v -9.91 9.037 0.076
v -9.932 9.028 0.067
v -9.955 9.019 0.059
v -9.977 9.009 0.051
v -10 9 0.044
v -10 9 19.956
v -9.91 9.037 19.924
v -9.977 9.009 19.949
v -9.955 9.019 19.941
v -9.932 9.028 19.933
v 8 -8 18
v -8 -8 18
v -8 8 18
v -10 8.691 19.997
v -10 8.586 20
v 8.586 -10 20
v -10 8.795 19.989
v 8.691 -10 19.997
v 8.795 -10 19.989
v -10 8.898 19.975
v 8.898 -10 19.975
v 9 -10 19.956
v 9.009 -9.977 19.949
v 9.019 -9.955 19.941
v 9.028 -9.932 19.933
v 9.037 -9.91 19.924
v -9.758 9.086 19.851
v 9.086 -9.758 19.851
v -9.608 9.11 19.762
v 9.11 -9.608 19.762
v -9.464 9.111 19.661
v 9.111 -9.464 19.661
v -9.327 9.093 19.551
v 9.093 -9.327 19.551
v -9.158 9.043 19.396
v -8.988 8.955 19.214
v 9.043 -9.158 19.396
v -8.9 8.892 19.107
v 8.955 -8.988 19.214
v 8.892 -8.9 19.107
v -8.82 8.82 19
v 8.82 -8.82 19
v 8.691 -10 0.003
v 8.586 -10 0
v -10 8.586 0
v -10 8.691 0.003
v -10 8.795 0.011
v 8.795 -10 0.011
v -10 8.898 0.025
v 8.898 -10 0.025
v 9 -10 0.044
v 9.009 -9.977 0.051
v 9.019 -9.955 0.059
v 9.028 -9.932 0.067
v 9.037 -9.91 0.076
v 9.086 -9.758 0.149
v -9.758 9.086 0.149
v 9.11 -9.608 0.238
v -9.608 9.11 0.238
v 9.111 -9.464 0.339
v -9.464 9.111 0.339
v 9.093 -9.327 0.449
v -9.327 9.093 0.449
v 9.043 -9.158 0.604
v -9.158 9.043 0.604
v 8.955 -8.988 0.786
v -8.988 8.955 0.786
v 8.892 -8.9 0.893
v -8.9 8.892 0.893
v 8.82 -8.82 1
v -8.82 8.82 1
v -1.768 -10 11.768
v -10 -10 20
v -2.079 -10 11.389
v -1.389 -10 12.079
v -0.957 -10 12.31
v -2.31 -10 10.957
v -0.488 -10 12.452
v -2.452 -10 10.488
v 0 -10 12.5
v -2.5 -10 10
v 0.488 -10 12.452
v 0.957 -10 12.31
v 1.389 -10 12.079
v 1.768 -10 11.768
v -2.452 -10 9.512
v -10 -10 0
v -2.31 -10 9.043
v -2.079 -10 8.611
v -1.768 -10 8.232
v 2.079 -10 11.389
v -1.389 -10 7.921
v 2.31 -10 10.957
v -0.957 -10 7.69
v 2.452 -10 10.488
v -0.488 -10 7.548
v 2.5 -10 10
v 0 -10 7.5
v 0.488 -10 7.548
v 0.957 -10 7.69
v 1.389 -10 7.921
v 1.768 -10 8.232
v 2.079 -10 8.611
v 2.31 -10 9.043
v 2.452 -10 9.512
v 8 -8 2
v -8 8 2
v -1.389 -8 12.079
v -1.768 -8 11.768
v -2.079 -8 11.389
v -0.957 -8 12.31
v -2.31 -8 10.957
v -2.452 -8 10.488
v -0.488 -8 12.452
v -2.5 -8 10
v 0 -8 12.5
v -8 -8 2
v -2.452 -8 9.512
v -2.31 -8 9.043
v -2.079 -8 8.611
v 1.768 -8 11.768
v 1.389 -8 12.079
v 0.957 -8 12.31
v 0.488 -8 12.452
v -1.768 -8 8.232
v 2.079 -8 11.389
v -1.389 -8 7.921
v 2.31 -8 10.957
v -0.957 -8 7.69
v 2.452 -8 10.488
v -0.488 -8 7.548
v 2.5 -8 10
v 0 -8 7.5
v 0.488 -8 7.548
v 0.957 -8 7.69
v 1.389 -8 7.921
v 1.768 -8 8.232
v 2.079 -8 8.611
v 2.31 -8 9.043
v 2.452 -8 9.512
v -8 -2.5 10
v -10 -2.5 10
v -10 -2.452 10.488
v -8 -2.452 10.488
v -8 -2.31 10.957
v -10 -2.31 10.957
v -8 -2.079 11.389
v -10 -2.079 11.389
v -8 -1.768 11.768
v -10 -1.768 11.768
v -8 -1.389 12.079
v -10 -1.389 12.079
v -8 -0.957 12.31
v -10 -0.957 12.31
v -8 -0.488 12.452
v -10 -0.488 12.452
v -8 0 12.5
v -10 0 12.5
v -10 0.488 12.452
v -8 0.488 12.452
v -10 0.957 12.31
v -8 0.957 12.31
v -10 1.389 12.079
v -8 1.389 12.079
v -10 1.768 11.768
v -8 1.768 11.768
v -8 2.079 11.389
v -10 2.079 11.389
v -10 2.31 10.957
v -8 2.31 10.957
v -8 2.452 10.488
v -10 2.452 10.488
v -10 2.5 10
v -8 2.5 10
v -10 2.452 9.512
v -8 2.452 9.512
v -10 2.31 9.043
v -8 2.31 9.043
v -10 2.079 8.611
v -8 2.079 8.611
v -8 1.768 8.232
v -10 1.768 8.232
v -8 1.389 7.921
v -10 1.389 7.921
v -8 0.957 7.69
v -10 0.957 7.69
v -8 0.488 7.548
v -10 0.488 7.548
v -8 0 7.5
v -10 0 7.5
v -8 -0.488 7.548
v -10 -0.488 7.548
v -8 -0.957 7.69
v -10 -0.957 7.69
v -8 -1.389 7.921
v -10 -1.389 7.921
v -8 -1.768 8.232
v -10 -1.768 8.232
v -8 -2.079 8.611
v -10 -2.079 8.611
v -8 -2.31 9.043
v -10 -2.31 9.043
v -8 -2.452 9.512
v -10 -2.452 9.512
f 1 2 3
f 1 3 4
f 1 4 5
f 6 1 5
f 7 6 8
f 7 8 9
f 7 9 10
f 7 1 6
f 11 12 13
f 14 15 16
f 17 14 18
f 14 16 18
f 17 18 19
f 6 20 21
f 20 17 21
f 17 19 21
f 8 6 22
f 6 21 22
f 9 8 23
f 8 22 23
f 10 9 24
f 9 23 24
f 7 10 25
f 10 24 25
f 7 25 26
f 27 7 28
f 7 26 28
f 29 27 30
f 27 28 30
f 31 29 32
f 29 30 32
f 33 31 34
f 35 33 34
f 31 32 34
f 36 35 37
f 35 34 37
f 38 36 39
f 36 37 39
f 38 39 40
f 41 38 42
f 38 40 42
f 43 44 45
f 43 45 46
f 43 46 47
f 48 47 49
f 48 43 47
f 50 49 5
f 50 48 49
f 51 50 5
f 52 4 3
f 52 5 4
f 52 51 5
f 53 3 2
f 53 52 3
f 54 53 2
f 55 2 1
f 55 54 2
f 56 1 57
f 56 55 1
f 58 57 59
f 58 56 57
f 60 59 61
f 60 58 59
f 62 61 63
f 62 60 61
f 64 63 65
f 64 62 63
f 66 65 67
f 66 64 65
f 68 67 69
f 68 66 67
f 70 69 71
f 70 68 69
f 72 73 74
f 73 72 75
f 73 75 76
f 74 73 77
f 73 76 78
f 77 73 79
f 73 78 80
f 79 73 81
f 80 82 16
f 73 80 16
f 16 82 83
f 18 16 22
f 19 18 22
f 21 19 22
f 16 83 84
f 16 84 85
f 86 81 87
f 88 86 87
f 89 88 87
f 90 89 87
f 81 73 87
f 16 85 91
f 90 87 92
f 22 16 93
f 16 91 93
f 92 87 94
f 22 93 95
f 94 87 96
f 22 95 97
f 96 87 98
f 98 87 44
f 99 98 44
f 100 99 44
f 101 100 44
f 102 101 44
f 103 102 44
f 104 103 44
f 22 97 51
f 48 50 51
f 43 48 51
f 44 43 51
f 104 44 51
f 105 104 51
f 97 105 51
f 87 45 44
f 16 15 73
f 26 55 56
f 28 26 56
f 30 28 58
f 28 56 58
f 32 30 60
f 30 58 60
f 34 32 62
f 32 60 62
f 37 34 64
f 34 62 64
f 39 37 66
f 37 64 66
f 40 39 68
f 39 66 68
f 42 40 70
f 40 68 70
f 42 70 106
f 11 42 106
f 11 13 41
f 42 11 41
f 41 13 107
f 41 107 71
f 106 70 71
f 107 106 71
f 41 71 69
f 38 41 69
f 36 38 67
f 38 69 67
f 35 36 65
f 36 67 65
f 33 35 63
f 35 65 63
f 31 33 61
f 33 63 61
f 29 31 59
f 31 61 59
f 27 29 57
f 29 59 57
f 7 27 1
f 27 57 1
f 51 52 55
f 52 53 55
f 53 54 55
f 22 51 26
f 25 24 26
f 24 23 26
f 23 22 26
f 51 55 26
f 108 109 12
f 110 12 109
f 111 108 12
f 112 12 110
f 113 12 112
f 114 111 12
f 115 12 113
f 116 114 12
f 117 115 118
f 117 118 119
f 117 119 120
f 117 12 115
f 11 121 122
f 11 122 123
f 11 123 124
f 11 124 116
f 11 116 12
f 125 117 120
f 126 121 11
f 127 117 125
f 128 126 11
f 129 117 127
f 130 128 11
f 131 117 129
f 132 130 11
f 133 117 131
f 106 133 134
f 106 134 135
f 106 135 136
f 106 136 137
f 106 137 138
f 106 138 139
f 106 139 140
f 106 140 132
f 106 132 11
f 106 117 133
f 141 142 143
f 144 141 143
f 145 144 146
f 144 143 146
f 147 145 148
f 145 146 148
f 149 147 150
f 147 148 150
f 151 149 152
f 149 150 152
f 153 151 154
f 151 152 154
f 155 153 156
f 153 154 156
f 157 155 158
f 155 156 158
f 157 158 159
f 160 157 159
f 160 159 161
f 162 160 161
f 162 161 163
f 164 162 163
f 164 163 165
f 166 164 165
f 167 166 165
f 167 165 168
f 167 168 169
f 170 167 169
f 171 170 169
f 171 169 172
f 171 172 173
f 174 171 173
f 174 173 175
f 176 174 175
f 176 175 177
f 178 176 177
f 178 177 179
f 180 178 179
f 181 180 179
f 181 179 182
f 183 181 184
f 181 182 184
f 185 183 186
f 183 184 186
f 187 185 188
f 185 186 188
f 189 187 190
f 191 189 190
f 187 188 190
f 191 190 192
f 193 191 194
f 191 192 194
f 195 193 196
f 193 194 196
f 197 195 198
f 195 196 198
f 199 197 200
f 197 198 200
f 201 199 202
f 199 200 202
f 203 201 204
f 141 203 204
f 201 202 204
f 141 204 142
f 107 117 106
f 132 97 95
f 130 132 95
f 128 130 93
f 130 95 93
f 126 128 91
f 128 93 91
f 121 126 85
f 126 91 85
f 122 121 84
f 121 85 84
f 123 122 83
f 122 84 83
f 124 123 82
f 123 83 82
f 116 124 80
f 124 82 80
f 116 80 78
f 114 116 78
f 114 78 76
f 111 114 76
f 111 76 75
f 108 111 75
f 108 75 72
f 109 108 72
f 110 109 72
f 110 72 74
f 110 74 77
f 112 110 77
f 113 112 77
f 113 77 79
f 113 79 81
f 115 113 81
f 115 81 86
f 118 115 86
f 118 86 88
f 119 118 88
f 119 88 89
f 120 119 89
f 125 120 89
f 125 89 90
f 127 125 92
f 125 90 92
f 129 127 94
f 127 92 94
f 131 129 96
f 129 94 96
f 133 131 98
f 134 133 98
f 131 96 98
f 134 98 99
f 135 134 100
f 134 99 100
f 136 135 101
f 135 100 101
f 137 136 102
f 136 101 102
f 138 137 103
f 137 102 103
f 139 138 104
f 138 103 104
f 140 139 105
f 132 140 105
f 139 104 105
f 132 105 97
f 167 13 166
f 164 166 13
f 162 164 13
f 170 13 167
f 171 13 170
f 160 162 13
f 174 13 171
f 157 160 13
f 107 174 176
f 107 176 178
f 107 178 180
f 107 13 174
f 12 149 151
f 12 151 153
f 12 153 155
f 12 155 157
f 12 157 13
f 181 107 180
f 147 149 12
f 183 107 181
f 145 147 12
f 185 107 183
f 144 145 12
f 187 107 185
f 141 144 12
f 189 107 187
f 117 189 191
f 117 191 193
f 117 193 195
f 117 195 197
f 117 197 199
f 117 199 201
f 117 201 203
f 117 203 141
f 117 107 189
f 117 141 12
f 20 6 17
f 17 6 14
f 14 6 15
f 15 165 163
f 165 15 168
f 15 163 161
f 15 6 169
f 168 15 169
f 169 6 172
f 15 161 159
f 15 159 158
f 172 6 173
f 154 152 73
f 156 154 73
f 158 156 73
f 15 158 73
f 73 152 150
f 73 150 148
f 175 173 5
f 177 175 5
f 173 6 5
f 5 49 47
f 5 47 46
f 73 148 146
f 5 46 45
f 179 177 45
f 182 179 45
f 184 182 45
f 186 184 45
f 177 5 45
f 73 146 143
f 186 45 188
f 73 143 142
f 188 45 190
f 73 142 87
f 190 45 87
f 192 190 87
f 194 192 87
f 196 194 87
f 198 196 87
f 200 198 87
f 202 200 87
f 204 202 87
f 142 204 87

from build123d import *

# Parameters (mm, degrees)
F0_DEPTH    = 20
F1_T        = -2
F4_D        = 5
F4_ON_F2_D  = 5
F5_SIZE     = 1
F7_T1_DEPTH = 31.2842712475
F7_T3_DEPTH = 23.3408931896


# Not quite as in the source:
# - a fillet or chamfer that OpenCascade refuses, or shapes differently, is made with other operations: its cross-section is extruded or revolved along the edge and cut away or added


with BuildPart() as f0:
    # F6 (on Top) → F0 (new body)
    with BuildSketch(Plane.XY):
        Polygon((-10, -10), (10, -10), (-10, 10), align=None)
    extrude(amount=F0_DEPTH)

    # F1
    f1_openings = [f0.faces().sort_by_distance(p)[0] for p in [
        (0, 0, 10),
    ]]
    offset(amount=F1_T, openings=f1_openings)

    # F4 (through all)
    with Locations(Plane(origin=(0, -8, 0), x_dir=(-1, 0, 0), z_dir=(0, 1, 0))):
        with Locations((0, 10)):
            Hole(F4_D / 2)

    # F4 on F2 (through all)
    with Locations(Plane.YZ.offset(-8)):
        with Locations((0, 10)):
            Hole(F4_ON_F2_D / 2)

    # F5
    f5_edges = [f0.edges().sort_by_distance(p)[0] for p in [
        (-10, 10, 10),
        (10, -10, 10),
    ]]
    chamfer(f5_edges, length=F5_SIZE)

    # F7: fillet of radius 1 on 4 edges, made by hand

    # F7_s2 → F7_t1 (cut)
    with BuildSketch(Plane(origin=(11.0606601718, -11.0606601718, 0), x_dir=(0, 0, 1), z_dir=(-0.7071067812, 0.7071067812, 0))):
        with BuildLine():
            ThreePointArc((0, -1), (0.2928932188, -0.2928932188), (1, 0))
            Line((1, 0), (0, 0))
            Line((0, 0), (0, -1))
        make_face()
        with BuildLine():
            ThreePointArc((20, -1), (19.7071067812, -0.2928932188), (19, 0))
            Line((19, 0), (20, 0))
            Line((20, 0), (20, -1))
        make_face()
    extrude(amount=F7_T1_DEPTH, mode=Mode.SUBTRACT)

    # F7_s4 → F7_t3 (cut)
    with BuildSketch(Plane.XY.offset(-1.6704465948)):
        with BuildLine():
            ThreePointArc((9.0371923242, -9.9102097864), (9.0940980721, -9.3324360321), (8.8204195729, -8.8204195729))
            Line((8.8204195729, -8.8204195729), (9.2928932188, -9.2928932188))
            Line((9.2928932188, -9.2928932188), (9.0371923242, -9.9102097864))
        make_face()
        with BuildLine():
            ThreePointArc((-8.8204195729, 8.8204195729), (-9.3324360321, 9.0940980721), (-9.9102097864, 9.0371923242))
            Line((-9.9102097864, 9.0371923242), (-9.2928932188, 9.2928932188))
            Line((-9.2928932188, 9.2928932188), (-8.8204195729, 8.8204195729))
        make_face()
    extrude(amount=F7_T3_DEPTH, mode=Mode.SUBTRACT)


solid = f0.part
